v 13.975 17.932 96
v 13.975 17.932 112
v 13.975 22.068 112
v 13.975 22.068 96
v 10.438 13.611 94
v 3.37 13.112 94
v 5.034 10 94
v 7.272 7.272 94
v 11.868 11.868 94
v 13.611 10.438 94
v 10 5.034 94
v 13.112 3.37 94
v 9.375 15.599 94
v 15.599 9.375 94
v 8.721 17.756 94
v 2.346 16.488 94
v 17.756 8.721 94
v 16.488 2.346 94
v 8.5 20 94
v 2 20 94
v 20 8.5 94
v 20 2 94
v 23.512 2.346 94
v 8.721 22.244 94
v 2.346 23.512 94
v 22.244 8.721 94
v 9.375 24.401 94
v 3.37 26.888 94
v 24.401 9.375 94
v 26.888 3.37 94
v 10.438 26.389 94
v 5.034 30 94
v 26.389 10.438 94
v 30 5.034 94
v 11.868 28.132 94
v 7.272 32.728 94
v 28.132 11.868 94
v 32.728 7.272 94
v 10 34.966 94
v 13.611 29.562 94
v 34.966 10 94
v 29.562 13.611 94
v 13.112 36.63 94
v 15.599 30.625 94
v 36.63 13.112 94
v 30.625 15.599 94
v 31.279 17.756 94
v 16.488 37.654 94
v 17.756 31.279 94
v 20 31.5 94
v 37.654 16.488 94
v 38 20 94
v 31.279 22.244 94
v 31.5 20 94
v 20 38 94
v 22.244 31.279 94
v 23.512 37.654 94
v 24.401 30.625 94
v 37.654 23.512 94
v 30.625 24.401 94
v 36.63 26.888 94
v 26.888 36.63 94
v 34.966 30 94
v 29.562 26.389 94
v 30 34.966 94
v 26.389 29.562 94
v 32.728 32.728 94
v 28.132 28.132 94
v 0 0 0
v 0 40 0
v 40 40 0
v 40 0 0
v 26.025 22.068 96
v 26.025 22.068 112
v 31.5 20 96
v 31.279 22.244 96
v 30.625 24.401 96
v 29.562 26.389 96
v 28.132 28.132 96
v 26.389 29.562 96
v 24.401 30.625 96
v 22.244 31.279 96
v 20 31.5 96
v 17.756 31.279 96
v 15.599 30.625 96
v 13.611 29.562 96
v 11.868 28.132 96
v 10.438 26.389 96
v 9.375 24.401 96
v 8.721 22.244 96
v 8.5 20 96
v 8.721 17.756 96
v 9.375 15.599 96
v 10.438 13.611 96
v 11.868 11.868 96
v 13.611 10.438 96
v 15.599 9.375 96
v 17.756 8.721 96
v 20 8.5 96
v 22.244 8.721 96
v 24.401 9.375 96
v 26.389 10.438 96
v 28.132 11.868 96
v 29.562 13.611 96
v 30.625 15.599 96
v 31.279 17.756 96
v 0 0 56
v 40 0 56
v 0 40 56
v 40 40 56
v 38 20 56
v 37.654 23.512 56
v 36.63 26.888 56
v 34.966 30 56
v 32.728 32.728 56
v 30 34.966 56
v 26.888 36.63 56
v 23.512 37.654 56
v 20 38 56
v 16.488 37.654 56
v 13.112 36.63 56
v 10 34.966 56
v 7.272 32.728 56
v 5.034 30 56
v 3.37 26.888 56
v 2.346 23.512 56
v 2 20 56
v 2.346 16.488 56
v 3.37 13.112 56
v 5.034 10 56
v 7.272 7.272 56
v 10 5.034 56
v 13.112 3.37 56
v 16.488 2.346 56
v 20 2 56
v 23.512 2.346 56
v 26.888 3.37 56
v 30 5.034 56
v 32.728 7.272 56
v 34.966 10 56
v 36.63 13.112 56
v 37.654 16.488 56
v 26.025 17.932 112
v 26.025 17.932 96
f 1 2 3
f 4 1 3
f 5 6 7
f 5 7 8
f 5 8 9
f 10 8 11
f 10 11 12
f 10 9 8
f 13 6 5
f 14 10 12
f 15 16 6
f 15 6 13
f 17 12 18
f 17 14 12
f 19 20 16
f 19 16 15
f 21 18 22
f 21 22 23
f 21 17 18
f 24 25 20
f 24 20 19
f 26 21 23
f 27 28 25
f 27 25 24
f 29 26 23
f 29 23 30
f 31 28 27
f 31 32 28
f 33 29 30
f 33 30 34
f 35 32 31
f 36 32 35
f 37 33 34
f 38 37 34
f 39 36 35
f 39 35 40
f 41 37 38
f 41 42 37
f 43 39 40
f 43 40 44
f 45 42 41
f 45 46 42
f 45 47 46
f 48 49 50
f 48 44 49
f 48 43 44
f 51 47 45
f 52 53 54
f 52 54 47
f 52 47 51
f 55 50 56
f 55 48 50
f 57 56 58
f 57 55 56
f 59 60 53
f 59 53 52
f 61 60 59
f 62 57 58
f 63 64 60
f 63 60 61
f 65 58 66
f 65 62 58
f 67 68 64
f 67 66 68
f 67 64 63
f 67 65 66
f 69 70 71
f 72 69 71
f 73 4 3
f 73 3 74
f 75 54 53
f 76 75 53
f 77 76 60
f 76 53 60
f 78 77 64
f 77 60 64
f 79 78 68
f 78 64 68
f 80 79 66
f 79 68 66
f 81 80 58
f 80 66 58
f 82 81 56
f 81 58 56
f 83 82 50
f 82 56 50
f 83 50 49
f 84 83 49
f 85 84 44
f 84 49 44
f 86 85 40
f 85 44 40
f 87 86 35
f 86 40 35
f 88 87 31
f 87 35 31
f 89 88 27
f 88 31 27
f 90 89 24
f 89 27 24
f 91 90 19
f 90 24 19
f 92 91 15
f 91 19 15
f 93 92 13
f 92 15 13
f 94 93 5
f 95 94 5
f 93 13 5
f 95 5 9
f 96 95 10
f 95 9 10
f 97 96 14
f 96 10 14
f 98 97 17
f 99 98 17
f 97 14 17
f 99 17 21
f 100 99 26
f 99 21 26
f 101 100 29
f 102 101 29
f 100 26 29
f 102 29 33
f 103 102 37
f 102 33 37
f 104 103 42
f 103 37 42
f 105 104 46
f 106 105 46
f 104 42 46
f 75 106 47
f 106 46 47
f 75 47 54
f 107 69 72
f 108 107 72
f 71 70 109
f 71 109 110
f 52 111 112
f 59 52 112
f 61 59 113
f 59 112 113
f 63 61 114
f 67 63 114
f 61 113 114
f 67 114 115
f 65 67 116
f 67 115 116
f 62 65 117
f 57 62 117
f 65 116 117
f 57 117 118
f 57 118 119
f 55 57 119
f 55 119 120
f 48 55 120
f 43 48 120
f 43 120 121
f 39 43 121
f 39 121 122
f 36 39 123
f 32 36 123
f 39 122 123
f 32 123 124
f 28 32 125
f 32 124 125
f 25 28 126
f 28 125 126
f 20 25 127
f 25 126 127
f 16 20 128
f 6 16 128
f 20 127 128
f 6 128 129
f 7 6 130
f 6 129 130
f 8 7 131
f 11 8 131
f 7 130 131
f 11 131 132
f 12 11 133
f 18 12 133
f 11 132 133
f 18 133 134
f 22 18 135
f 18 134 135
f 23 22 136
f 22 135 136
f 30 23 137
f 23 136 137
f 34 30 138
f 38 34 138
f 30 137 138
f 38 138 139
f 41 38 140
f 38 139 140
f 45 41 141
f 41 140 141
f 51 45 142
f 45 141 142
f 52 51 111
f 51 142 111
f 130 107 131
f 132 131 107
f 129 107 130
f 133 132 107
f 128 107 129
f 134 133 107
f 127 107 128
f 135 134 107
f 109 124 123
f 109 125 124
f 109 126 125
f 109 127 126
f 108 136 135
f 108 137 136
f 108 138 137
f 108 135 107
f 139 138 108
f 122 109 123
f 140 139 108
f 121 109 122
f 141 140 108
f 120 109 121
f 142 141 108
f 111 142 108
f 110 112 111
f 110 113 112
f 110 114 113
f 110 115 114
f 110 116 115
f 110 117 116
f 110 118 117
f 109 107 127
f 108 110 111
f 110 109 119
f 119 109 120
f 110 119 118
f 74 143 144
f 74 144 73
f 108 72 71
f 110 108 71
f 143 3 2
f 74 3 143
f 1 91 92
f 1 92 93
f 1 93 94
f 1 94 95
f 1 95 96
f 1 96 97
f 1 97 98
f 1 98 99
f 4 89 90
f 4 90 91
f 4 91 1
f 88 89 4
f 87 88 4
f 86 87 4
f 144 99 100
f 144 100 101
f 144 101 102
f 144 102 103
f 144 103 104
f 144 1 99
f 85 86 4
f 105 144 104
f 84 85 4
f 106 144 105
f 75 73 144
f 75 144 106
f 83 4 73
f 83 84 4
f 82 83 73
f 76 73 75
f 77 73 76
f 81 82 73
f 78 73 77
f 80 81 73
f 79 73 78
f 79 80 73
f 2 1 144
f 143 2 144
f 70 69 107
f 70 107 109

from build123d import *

# Parameters (mm, degrees)
ESQUISSE1_W        = 40
ESQUISSE1_H        = 40
BOSS_EXTRU_1_DEPTH = 56
ESQUISSE2_R        = 18
BOSS_EXTRU_2_DEPTH = 38
ESQUISSE3_R        = 11.5
BOSS_EXTRU_3_DEPTH = 2
ESQUISSE4_W        = 12.050195296
ESQUISSE4_H        = 4.136634206
BOSS_EXTRU_4_DEPTH = 16


with BuildPart() as part:
    # Esquisse1 → Boss.-Extru.1 (new body)
    with BuildSketch(Plane.XY):
        with Locations((20, 20)):
            Rectangle(ESQUISSE1_W, ESQUISSE1_H)
    extrude(amount=BOSS_EXTRU_1_DEPTH)

    # Esquisse2 → Boss.-Extru.2 (add)
    with BuildSketch(Plane.XY.offset(56)):
        with Locations((20, 20)):
            Circle(ESQUISSE2_R)
    extrude(amount=BOSS_EXTRU_2_DEPTH)

    # Esquisse3 → Boss.-Extru.3 (add)
    with BuildSketch(Plane.XY.offset(94)):
        with Locations((20, 20)):
            Circle(ESQUISSE3_R)
    extrude(amount=BOSS_EXTRU_3_DEPTH)

    # Esquisse4 → Boss.-Extru.4 (add)
    with BuildSketch(Plane.XY.offset(96)):
        with Locations((20, 20)):
            Rectangle(ESQUISSE4_W, ESQUISSE4_H)
    extrude(amount=BOSS_EXTRU_4_DEPTH)


solid = part.part
